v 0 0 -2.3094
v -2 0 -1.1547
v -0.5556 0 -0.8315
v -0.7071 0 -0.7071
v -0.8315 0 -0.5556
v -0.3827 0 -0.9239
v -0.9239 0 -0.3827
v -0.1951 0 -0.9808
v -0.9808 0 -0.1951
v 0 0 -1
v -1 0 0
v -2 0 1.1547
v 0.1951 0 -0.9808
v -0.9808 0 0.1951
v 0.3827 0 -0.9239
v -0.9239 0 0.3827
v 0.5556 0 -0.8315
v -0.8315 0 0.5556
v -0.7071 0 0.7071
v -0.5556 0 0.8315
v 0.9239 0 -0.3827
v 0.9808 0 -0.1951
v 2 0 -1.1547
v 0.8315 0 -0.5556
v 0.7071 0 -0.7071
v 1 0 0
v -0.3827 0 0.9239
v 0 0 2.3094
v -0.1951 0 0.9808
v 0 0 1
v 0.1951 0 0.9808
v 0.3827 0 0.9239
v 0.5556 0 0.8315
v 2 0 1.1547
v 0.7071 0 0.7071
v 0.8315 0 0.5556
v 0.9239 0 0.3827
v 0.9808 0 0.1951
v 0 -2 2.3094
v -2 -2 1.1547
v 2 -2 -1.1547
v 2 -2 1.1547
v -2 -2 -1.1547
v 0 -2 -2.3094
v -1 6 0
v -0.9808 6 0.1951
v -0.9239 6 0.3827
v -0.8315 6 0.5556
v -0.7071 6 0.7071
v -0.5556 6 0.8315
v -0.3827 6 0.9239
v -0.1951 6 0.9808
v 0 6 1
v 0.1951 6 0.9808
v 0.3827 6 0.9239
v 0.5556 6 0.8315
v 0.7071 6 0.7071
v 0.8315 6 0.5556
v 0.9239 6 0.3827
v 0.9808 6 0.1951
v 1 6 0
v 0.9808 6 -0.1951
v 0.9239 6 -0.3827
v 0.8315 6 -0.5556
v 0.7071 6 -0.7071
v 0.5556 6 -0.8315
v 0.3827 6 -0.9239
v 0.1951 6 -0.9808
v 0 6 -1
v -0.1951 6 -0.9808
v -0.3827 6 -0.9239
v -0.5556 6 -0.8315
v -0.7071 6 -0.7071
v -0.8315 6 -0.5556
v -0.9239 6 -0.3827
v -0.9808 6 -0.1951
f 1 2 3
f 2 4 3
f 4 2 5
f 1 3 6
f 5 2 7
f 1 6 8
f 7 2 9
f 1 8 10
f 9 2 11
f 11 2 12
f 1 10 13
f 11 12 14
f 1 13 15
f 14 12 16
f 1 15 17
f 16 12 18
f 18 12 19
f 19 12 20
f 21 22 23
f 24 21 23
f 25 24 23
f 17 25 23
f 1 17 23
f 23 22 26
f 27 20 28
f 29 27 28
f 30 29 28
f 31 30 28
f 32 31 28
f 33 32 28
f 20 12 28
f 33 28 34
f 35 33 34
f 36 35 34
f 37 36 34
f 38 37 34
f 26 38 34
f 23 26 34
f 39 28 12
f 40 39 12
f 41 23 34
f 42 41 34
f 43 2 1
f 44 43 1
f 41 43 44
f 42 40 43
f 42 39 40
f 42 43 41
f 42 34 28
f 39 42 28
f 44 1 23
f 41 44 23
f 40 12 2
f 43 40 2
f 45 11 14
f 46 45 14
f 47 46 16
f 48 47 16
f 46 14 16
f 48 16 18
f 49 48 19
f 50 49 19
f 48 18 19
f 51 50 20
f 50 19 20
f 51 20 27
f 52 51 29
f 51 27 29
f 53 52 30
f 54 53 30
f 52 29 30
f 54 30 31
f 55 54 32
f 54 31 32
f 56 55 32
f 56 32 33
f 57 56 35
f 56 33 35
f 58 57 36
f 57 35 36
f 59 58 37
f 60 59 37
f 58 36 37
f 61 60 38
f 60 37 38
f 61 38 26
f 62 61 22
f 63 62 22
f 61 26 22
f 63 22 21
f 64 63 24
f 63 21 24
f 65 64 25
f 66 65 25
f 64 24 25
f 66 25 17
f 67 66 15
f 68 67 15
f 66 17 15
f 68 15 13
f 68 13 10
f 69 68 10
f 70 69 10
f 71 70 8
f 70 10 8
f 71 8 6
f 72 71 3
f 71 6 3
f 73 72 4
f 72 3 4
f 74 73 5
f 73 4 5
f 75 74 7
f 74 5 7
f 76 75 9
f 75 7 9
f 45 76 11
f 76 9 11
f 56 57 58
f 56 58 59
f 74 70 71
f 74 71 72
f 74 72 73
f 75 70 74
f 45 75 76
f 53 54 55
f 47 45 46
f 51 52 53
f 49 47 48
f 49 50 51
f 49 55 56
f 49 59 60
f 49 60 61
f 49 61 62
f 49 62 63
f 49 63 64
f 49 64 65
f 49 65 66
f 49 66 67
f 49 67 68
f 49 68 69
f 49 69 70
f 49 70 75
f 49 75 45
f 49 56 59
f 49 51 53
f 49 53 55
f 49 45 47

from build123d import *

# Parameters (mm, degrees)
F0_R     = 1
F1_DEPTH = 2
F2_R     = 1
F3_DEPTH = 6


# Not quite as in the source:
# - a feature of the source that left no trace in its solid (it failed there, or was rolled back) is left out


with BuildPart() as f1:
    # F0 (on Front) → F1 (new body)
    with BuildSketch(Plane.XZ):
        Polygon((-2, 1.1547005384), (-2, -1.1547005384), (0, -2.3094010768), (2, -1.1547005384), (2, 1.1547005384), (0, 2.3094010768), align=None)
        Circle(F0_R, mode=Mode.SUBTRACT)
        Circle(F0_R)
    extrude(amount=F1_DEPTH)

    # F2 (on face) → F3 (join)
    with BuildSketch(Plane(origin=(0, 0, 0), x_dir=(-1, 0, 0), z_dir=(0, 1, 0))):
        Circle(F2_R)
    extrude(amount=F3_DEPTH)


solid = f1.part
